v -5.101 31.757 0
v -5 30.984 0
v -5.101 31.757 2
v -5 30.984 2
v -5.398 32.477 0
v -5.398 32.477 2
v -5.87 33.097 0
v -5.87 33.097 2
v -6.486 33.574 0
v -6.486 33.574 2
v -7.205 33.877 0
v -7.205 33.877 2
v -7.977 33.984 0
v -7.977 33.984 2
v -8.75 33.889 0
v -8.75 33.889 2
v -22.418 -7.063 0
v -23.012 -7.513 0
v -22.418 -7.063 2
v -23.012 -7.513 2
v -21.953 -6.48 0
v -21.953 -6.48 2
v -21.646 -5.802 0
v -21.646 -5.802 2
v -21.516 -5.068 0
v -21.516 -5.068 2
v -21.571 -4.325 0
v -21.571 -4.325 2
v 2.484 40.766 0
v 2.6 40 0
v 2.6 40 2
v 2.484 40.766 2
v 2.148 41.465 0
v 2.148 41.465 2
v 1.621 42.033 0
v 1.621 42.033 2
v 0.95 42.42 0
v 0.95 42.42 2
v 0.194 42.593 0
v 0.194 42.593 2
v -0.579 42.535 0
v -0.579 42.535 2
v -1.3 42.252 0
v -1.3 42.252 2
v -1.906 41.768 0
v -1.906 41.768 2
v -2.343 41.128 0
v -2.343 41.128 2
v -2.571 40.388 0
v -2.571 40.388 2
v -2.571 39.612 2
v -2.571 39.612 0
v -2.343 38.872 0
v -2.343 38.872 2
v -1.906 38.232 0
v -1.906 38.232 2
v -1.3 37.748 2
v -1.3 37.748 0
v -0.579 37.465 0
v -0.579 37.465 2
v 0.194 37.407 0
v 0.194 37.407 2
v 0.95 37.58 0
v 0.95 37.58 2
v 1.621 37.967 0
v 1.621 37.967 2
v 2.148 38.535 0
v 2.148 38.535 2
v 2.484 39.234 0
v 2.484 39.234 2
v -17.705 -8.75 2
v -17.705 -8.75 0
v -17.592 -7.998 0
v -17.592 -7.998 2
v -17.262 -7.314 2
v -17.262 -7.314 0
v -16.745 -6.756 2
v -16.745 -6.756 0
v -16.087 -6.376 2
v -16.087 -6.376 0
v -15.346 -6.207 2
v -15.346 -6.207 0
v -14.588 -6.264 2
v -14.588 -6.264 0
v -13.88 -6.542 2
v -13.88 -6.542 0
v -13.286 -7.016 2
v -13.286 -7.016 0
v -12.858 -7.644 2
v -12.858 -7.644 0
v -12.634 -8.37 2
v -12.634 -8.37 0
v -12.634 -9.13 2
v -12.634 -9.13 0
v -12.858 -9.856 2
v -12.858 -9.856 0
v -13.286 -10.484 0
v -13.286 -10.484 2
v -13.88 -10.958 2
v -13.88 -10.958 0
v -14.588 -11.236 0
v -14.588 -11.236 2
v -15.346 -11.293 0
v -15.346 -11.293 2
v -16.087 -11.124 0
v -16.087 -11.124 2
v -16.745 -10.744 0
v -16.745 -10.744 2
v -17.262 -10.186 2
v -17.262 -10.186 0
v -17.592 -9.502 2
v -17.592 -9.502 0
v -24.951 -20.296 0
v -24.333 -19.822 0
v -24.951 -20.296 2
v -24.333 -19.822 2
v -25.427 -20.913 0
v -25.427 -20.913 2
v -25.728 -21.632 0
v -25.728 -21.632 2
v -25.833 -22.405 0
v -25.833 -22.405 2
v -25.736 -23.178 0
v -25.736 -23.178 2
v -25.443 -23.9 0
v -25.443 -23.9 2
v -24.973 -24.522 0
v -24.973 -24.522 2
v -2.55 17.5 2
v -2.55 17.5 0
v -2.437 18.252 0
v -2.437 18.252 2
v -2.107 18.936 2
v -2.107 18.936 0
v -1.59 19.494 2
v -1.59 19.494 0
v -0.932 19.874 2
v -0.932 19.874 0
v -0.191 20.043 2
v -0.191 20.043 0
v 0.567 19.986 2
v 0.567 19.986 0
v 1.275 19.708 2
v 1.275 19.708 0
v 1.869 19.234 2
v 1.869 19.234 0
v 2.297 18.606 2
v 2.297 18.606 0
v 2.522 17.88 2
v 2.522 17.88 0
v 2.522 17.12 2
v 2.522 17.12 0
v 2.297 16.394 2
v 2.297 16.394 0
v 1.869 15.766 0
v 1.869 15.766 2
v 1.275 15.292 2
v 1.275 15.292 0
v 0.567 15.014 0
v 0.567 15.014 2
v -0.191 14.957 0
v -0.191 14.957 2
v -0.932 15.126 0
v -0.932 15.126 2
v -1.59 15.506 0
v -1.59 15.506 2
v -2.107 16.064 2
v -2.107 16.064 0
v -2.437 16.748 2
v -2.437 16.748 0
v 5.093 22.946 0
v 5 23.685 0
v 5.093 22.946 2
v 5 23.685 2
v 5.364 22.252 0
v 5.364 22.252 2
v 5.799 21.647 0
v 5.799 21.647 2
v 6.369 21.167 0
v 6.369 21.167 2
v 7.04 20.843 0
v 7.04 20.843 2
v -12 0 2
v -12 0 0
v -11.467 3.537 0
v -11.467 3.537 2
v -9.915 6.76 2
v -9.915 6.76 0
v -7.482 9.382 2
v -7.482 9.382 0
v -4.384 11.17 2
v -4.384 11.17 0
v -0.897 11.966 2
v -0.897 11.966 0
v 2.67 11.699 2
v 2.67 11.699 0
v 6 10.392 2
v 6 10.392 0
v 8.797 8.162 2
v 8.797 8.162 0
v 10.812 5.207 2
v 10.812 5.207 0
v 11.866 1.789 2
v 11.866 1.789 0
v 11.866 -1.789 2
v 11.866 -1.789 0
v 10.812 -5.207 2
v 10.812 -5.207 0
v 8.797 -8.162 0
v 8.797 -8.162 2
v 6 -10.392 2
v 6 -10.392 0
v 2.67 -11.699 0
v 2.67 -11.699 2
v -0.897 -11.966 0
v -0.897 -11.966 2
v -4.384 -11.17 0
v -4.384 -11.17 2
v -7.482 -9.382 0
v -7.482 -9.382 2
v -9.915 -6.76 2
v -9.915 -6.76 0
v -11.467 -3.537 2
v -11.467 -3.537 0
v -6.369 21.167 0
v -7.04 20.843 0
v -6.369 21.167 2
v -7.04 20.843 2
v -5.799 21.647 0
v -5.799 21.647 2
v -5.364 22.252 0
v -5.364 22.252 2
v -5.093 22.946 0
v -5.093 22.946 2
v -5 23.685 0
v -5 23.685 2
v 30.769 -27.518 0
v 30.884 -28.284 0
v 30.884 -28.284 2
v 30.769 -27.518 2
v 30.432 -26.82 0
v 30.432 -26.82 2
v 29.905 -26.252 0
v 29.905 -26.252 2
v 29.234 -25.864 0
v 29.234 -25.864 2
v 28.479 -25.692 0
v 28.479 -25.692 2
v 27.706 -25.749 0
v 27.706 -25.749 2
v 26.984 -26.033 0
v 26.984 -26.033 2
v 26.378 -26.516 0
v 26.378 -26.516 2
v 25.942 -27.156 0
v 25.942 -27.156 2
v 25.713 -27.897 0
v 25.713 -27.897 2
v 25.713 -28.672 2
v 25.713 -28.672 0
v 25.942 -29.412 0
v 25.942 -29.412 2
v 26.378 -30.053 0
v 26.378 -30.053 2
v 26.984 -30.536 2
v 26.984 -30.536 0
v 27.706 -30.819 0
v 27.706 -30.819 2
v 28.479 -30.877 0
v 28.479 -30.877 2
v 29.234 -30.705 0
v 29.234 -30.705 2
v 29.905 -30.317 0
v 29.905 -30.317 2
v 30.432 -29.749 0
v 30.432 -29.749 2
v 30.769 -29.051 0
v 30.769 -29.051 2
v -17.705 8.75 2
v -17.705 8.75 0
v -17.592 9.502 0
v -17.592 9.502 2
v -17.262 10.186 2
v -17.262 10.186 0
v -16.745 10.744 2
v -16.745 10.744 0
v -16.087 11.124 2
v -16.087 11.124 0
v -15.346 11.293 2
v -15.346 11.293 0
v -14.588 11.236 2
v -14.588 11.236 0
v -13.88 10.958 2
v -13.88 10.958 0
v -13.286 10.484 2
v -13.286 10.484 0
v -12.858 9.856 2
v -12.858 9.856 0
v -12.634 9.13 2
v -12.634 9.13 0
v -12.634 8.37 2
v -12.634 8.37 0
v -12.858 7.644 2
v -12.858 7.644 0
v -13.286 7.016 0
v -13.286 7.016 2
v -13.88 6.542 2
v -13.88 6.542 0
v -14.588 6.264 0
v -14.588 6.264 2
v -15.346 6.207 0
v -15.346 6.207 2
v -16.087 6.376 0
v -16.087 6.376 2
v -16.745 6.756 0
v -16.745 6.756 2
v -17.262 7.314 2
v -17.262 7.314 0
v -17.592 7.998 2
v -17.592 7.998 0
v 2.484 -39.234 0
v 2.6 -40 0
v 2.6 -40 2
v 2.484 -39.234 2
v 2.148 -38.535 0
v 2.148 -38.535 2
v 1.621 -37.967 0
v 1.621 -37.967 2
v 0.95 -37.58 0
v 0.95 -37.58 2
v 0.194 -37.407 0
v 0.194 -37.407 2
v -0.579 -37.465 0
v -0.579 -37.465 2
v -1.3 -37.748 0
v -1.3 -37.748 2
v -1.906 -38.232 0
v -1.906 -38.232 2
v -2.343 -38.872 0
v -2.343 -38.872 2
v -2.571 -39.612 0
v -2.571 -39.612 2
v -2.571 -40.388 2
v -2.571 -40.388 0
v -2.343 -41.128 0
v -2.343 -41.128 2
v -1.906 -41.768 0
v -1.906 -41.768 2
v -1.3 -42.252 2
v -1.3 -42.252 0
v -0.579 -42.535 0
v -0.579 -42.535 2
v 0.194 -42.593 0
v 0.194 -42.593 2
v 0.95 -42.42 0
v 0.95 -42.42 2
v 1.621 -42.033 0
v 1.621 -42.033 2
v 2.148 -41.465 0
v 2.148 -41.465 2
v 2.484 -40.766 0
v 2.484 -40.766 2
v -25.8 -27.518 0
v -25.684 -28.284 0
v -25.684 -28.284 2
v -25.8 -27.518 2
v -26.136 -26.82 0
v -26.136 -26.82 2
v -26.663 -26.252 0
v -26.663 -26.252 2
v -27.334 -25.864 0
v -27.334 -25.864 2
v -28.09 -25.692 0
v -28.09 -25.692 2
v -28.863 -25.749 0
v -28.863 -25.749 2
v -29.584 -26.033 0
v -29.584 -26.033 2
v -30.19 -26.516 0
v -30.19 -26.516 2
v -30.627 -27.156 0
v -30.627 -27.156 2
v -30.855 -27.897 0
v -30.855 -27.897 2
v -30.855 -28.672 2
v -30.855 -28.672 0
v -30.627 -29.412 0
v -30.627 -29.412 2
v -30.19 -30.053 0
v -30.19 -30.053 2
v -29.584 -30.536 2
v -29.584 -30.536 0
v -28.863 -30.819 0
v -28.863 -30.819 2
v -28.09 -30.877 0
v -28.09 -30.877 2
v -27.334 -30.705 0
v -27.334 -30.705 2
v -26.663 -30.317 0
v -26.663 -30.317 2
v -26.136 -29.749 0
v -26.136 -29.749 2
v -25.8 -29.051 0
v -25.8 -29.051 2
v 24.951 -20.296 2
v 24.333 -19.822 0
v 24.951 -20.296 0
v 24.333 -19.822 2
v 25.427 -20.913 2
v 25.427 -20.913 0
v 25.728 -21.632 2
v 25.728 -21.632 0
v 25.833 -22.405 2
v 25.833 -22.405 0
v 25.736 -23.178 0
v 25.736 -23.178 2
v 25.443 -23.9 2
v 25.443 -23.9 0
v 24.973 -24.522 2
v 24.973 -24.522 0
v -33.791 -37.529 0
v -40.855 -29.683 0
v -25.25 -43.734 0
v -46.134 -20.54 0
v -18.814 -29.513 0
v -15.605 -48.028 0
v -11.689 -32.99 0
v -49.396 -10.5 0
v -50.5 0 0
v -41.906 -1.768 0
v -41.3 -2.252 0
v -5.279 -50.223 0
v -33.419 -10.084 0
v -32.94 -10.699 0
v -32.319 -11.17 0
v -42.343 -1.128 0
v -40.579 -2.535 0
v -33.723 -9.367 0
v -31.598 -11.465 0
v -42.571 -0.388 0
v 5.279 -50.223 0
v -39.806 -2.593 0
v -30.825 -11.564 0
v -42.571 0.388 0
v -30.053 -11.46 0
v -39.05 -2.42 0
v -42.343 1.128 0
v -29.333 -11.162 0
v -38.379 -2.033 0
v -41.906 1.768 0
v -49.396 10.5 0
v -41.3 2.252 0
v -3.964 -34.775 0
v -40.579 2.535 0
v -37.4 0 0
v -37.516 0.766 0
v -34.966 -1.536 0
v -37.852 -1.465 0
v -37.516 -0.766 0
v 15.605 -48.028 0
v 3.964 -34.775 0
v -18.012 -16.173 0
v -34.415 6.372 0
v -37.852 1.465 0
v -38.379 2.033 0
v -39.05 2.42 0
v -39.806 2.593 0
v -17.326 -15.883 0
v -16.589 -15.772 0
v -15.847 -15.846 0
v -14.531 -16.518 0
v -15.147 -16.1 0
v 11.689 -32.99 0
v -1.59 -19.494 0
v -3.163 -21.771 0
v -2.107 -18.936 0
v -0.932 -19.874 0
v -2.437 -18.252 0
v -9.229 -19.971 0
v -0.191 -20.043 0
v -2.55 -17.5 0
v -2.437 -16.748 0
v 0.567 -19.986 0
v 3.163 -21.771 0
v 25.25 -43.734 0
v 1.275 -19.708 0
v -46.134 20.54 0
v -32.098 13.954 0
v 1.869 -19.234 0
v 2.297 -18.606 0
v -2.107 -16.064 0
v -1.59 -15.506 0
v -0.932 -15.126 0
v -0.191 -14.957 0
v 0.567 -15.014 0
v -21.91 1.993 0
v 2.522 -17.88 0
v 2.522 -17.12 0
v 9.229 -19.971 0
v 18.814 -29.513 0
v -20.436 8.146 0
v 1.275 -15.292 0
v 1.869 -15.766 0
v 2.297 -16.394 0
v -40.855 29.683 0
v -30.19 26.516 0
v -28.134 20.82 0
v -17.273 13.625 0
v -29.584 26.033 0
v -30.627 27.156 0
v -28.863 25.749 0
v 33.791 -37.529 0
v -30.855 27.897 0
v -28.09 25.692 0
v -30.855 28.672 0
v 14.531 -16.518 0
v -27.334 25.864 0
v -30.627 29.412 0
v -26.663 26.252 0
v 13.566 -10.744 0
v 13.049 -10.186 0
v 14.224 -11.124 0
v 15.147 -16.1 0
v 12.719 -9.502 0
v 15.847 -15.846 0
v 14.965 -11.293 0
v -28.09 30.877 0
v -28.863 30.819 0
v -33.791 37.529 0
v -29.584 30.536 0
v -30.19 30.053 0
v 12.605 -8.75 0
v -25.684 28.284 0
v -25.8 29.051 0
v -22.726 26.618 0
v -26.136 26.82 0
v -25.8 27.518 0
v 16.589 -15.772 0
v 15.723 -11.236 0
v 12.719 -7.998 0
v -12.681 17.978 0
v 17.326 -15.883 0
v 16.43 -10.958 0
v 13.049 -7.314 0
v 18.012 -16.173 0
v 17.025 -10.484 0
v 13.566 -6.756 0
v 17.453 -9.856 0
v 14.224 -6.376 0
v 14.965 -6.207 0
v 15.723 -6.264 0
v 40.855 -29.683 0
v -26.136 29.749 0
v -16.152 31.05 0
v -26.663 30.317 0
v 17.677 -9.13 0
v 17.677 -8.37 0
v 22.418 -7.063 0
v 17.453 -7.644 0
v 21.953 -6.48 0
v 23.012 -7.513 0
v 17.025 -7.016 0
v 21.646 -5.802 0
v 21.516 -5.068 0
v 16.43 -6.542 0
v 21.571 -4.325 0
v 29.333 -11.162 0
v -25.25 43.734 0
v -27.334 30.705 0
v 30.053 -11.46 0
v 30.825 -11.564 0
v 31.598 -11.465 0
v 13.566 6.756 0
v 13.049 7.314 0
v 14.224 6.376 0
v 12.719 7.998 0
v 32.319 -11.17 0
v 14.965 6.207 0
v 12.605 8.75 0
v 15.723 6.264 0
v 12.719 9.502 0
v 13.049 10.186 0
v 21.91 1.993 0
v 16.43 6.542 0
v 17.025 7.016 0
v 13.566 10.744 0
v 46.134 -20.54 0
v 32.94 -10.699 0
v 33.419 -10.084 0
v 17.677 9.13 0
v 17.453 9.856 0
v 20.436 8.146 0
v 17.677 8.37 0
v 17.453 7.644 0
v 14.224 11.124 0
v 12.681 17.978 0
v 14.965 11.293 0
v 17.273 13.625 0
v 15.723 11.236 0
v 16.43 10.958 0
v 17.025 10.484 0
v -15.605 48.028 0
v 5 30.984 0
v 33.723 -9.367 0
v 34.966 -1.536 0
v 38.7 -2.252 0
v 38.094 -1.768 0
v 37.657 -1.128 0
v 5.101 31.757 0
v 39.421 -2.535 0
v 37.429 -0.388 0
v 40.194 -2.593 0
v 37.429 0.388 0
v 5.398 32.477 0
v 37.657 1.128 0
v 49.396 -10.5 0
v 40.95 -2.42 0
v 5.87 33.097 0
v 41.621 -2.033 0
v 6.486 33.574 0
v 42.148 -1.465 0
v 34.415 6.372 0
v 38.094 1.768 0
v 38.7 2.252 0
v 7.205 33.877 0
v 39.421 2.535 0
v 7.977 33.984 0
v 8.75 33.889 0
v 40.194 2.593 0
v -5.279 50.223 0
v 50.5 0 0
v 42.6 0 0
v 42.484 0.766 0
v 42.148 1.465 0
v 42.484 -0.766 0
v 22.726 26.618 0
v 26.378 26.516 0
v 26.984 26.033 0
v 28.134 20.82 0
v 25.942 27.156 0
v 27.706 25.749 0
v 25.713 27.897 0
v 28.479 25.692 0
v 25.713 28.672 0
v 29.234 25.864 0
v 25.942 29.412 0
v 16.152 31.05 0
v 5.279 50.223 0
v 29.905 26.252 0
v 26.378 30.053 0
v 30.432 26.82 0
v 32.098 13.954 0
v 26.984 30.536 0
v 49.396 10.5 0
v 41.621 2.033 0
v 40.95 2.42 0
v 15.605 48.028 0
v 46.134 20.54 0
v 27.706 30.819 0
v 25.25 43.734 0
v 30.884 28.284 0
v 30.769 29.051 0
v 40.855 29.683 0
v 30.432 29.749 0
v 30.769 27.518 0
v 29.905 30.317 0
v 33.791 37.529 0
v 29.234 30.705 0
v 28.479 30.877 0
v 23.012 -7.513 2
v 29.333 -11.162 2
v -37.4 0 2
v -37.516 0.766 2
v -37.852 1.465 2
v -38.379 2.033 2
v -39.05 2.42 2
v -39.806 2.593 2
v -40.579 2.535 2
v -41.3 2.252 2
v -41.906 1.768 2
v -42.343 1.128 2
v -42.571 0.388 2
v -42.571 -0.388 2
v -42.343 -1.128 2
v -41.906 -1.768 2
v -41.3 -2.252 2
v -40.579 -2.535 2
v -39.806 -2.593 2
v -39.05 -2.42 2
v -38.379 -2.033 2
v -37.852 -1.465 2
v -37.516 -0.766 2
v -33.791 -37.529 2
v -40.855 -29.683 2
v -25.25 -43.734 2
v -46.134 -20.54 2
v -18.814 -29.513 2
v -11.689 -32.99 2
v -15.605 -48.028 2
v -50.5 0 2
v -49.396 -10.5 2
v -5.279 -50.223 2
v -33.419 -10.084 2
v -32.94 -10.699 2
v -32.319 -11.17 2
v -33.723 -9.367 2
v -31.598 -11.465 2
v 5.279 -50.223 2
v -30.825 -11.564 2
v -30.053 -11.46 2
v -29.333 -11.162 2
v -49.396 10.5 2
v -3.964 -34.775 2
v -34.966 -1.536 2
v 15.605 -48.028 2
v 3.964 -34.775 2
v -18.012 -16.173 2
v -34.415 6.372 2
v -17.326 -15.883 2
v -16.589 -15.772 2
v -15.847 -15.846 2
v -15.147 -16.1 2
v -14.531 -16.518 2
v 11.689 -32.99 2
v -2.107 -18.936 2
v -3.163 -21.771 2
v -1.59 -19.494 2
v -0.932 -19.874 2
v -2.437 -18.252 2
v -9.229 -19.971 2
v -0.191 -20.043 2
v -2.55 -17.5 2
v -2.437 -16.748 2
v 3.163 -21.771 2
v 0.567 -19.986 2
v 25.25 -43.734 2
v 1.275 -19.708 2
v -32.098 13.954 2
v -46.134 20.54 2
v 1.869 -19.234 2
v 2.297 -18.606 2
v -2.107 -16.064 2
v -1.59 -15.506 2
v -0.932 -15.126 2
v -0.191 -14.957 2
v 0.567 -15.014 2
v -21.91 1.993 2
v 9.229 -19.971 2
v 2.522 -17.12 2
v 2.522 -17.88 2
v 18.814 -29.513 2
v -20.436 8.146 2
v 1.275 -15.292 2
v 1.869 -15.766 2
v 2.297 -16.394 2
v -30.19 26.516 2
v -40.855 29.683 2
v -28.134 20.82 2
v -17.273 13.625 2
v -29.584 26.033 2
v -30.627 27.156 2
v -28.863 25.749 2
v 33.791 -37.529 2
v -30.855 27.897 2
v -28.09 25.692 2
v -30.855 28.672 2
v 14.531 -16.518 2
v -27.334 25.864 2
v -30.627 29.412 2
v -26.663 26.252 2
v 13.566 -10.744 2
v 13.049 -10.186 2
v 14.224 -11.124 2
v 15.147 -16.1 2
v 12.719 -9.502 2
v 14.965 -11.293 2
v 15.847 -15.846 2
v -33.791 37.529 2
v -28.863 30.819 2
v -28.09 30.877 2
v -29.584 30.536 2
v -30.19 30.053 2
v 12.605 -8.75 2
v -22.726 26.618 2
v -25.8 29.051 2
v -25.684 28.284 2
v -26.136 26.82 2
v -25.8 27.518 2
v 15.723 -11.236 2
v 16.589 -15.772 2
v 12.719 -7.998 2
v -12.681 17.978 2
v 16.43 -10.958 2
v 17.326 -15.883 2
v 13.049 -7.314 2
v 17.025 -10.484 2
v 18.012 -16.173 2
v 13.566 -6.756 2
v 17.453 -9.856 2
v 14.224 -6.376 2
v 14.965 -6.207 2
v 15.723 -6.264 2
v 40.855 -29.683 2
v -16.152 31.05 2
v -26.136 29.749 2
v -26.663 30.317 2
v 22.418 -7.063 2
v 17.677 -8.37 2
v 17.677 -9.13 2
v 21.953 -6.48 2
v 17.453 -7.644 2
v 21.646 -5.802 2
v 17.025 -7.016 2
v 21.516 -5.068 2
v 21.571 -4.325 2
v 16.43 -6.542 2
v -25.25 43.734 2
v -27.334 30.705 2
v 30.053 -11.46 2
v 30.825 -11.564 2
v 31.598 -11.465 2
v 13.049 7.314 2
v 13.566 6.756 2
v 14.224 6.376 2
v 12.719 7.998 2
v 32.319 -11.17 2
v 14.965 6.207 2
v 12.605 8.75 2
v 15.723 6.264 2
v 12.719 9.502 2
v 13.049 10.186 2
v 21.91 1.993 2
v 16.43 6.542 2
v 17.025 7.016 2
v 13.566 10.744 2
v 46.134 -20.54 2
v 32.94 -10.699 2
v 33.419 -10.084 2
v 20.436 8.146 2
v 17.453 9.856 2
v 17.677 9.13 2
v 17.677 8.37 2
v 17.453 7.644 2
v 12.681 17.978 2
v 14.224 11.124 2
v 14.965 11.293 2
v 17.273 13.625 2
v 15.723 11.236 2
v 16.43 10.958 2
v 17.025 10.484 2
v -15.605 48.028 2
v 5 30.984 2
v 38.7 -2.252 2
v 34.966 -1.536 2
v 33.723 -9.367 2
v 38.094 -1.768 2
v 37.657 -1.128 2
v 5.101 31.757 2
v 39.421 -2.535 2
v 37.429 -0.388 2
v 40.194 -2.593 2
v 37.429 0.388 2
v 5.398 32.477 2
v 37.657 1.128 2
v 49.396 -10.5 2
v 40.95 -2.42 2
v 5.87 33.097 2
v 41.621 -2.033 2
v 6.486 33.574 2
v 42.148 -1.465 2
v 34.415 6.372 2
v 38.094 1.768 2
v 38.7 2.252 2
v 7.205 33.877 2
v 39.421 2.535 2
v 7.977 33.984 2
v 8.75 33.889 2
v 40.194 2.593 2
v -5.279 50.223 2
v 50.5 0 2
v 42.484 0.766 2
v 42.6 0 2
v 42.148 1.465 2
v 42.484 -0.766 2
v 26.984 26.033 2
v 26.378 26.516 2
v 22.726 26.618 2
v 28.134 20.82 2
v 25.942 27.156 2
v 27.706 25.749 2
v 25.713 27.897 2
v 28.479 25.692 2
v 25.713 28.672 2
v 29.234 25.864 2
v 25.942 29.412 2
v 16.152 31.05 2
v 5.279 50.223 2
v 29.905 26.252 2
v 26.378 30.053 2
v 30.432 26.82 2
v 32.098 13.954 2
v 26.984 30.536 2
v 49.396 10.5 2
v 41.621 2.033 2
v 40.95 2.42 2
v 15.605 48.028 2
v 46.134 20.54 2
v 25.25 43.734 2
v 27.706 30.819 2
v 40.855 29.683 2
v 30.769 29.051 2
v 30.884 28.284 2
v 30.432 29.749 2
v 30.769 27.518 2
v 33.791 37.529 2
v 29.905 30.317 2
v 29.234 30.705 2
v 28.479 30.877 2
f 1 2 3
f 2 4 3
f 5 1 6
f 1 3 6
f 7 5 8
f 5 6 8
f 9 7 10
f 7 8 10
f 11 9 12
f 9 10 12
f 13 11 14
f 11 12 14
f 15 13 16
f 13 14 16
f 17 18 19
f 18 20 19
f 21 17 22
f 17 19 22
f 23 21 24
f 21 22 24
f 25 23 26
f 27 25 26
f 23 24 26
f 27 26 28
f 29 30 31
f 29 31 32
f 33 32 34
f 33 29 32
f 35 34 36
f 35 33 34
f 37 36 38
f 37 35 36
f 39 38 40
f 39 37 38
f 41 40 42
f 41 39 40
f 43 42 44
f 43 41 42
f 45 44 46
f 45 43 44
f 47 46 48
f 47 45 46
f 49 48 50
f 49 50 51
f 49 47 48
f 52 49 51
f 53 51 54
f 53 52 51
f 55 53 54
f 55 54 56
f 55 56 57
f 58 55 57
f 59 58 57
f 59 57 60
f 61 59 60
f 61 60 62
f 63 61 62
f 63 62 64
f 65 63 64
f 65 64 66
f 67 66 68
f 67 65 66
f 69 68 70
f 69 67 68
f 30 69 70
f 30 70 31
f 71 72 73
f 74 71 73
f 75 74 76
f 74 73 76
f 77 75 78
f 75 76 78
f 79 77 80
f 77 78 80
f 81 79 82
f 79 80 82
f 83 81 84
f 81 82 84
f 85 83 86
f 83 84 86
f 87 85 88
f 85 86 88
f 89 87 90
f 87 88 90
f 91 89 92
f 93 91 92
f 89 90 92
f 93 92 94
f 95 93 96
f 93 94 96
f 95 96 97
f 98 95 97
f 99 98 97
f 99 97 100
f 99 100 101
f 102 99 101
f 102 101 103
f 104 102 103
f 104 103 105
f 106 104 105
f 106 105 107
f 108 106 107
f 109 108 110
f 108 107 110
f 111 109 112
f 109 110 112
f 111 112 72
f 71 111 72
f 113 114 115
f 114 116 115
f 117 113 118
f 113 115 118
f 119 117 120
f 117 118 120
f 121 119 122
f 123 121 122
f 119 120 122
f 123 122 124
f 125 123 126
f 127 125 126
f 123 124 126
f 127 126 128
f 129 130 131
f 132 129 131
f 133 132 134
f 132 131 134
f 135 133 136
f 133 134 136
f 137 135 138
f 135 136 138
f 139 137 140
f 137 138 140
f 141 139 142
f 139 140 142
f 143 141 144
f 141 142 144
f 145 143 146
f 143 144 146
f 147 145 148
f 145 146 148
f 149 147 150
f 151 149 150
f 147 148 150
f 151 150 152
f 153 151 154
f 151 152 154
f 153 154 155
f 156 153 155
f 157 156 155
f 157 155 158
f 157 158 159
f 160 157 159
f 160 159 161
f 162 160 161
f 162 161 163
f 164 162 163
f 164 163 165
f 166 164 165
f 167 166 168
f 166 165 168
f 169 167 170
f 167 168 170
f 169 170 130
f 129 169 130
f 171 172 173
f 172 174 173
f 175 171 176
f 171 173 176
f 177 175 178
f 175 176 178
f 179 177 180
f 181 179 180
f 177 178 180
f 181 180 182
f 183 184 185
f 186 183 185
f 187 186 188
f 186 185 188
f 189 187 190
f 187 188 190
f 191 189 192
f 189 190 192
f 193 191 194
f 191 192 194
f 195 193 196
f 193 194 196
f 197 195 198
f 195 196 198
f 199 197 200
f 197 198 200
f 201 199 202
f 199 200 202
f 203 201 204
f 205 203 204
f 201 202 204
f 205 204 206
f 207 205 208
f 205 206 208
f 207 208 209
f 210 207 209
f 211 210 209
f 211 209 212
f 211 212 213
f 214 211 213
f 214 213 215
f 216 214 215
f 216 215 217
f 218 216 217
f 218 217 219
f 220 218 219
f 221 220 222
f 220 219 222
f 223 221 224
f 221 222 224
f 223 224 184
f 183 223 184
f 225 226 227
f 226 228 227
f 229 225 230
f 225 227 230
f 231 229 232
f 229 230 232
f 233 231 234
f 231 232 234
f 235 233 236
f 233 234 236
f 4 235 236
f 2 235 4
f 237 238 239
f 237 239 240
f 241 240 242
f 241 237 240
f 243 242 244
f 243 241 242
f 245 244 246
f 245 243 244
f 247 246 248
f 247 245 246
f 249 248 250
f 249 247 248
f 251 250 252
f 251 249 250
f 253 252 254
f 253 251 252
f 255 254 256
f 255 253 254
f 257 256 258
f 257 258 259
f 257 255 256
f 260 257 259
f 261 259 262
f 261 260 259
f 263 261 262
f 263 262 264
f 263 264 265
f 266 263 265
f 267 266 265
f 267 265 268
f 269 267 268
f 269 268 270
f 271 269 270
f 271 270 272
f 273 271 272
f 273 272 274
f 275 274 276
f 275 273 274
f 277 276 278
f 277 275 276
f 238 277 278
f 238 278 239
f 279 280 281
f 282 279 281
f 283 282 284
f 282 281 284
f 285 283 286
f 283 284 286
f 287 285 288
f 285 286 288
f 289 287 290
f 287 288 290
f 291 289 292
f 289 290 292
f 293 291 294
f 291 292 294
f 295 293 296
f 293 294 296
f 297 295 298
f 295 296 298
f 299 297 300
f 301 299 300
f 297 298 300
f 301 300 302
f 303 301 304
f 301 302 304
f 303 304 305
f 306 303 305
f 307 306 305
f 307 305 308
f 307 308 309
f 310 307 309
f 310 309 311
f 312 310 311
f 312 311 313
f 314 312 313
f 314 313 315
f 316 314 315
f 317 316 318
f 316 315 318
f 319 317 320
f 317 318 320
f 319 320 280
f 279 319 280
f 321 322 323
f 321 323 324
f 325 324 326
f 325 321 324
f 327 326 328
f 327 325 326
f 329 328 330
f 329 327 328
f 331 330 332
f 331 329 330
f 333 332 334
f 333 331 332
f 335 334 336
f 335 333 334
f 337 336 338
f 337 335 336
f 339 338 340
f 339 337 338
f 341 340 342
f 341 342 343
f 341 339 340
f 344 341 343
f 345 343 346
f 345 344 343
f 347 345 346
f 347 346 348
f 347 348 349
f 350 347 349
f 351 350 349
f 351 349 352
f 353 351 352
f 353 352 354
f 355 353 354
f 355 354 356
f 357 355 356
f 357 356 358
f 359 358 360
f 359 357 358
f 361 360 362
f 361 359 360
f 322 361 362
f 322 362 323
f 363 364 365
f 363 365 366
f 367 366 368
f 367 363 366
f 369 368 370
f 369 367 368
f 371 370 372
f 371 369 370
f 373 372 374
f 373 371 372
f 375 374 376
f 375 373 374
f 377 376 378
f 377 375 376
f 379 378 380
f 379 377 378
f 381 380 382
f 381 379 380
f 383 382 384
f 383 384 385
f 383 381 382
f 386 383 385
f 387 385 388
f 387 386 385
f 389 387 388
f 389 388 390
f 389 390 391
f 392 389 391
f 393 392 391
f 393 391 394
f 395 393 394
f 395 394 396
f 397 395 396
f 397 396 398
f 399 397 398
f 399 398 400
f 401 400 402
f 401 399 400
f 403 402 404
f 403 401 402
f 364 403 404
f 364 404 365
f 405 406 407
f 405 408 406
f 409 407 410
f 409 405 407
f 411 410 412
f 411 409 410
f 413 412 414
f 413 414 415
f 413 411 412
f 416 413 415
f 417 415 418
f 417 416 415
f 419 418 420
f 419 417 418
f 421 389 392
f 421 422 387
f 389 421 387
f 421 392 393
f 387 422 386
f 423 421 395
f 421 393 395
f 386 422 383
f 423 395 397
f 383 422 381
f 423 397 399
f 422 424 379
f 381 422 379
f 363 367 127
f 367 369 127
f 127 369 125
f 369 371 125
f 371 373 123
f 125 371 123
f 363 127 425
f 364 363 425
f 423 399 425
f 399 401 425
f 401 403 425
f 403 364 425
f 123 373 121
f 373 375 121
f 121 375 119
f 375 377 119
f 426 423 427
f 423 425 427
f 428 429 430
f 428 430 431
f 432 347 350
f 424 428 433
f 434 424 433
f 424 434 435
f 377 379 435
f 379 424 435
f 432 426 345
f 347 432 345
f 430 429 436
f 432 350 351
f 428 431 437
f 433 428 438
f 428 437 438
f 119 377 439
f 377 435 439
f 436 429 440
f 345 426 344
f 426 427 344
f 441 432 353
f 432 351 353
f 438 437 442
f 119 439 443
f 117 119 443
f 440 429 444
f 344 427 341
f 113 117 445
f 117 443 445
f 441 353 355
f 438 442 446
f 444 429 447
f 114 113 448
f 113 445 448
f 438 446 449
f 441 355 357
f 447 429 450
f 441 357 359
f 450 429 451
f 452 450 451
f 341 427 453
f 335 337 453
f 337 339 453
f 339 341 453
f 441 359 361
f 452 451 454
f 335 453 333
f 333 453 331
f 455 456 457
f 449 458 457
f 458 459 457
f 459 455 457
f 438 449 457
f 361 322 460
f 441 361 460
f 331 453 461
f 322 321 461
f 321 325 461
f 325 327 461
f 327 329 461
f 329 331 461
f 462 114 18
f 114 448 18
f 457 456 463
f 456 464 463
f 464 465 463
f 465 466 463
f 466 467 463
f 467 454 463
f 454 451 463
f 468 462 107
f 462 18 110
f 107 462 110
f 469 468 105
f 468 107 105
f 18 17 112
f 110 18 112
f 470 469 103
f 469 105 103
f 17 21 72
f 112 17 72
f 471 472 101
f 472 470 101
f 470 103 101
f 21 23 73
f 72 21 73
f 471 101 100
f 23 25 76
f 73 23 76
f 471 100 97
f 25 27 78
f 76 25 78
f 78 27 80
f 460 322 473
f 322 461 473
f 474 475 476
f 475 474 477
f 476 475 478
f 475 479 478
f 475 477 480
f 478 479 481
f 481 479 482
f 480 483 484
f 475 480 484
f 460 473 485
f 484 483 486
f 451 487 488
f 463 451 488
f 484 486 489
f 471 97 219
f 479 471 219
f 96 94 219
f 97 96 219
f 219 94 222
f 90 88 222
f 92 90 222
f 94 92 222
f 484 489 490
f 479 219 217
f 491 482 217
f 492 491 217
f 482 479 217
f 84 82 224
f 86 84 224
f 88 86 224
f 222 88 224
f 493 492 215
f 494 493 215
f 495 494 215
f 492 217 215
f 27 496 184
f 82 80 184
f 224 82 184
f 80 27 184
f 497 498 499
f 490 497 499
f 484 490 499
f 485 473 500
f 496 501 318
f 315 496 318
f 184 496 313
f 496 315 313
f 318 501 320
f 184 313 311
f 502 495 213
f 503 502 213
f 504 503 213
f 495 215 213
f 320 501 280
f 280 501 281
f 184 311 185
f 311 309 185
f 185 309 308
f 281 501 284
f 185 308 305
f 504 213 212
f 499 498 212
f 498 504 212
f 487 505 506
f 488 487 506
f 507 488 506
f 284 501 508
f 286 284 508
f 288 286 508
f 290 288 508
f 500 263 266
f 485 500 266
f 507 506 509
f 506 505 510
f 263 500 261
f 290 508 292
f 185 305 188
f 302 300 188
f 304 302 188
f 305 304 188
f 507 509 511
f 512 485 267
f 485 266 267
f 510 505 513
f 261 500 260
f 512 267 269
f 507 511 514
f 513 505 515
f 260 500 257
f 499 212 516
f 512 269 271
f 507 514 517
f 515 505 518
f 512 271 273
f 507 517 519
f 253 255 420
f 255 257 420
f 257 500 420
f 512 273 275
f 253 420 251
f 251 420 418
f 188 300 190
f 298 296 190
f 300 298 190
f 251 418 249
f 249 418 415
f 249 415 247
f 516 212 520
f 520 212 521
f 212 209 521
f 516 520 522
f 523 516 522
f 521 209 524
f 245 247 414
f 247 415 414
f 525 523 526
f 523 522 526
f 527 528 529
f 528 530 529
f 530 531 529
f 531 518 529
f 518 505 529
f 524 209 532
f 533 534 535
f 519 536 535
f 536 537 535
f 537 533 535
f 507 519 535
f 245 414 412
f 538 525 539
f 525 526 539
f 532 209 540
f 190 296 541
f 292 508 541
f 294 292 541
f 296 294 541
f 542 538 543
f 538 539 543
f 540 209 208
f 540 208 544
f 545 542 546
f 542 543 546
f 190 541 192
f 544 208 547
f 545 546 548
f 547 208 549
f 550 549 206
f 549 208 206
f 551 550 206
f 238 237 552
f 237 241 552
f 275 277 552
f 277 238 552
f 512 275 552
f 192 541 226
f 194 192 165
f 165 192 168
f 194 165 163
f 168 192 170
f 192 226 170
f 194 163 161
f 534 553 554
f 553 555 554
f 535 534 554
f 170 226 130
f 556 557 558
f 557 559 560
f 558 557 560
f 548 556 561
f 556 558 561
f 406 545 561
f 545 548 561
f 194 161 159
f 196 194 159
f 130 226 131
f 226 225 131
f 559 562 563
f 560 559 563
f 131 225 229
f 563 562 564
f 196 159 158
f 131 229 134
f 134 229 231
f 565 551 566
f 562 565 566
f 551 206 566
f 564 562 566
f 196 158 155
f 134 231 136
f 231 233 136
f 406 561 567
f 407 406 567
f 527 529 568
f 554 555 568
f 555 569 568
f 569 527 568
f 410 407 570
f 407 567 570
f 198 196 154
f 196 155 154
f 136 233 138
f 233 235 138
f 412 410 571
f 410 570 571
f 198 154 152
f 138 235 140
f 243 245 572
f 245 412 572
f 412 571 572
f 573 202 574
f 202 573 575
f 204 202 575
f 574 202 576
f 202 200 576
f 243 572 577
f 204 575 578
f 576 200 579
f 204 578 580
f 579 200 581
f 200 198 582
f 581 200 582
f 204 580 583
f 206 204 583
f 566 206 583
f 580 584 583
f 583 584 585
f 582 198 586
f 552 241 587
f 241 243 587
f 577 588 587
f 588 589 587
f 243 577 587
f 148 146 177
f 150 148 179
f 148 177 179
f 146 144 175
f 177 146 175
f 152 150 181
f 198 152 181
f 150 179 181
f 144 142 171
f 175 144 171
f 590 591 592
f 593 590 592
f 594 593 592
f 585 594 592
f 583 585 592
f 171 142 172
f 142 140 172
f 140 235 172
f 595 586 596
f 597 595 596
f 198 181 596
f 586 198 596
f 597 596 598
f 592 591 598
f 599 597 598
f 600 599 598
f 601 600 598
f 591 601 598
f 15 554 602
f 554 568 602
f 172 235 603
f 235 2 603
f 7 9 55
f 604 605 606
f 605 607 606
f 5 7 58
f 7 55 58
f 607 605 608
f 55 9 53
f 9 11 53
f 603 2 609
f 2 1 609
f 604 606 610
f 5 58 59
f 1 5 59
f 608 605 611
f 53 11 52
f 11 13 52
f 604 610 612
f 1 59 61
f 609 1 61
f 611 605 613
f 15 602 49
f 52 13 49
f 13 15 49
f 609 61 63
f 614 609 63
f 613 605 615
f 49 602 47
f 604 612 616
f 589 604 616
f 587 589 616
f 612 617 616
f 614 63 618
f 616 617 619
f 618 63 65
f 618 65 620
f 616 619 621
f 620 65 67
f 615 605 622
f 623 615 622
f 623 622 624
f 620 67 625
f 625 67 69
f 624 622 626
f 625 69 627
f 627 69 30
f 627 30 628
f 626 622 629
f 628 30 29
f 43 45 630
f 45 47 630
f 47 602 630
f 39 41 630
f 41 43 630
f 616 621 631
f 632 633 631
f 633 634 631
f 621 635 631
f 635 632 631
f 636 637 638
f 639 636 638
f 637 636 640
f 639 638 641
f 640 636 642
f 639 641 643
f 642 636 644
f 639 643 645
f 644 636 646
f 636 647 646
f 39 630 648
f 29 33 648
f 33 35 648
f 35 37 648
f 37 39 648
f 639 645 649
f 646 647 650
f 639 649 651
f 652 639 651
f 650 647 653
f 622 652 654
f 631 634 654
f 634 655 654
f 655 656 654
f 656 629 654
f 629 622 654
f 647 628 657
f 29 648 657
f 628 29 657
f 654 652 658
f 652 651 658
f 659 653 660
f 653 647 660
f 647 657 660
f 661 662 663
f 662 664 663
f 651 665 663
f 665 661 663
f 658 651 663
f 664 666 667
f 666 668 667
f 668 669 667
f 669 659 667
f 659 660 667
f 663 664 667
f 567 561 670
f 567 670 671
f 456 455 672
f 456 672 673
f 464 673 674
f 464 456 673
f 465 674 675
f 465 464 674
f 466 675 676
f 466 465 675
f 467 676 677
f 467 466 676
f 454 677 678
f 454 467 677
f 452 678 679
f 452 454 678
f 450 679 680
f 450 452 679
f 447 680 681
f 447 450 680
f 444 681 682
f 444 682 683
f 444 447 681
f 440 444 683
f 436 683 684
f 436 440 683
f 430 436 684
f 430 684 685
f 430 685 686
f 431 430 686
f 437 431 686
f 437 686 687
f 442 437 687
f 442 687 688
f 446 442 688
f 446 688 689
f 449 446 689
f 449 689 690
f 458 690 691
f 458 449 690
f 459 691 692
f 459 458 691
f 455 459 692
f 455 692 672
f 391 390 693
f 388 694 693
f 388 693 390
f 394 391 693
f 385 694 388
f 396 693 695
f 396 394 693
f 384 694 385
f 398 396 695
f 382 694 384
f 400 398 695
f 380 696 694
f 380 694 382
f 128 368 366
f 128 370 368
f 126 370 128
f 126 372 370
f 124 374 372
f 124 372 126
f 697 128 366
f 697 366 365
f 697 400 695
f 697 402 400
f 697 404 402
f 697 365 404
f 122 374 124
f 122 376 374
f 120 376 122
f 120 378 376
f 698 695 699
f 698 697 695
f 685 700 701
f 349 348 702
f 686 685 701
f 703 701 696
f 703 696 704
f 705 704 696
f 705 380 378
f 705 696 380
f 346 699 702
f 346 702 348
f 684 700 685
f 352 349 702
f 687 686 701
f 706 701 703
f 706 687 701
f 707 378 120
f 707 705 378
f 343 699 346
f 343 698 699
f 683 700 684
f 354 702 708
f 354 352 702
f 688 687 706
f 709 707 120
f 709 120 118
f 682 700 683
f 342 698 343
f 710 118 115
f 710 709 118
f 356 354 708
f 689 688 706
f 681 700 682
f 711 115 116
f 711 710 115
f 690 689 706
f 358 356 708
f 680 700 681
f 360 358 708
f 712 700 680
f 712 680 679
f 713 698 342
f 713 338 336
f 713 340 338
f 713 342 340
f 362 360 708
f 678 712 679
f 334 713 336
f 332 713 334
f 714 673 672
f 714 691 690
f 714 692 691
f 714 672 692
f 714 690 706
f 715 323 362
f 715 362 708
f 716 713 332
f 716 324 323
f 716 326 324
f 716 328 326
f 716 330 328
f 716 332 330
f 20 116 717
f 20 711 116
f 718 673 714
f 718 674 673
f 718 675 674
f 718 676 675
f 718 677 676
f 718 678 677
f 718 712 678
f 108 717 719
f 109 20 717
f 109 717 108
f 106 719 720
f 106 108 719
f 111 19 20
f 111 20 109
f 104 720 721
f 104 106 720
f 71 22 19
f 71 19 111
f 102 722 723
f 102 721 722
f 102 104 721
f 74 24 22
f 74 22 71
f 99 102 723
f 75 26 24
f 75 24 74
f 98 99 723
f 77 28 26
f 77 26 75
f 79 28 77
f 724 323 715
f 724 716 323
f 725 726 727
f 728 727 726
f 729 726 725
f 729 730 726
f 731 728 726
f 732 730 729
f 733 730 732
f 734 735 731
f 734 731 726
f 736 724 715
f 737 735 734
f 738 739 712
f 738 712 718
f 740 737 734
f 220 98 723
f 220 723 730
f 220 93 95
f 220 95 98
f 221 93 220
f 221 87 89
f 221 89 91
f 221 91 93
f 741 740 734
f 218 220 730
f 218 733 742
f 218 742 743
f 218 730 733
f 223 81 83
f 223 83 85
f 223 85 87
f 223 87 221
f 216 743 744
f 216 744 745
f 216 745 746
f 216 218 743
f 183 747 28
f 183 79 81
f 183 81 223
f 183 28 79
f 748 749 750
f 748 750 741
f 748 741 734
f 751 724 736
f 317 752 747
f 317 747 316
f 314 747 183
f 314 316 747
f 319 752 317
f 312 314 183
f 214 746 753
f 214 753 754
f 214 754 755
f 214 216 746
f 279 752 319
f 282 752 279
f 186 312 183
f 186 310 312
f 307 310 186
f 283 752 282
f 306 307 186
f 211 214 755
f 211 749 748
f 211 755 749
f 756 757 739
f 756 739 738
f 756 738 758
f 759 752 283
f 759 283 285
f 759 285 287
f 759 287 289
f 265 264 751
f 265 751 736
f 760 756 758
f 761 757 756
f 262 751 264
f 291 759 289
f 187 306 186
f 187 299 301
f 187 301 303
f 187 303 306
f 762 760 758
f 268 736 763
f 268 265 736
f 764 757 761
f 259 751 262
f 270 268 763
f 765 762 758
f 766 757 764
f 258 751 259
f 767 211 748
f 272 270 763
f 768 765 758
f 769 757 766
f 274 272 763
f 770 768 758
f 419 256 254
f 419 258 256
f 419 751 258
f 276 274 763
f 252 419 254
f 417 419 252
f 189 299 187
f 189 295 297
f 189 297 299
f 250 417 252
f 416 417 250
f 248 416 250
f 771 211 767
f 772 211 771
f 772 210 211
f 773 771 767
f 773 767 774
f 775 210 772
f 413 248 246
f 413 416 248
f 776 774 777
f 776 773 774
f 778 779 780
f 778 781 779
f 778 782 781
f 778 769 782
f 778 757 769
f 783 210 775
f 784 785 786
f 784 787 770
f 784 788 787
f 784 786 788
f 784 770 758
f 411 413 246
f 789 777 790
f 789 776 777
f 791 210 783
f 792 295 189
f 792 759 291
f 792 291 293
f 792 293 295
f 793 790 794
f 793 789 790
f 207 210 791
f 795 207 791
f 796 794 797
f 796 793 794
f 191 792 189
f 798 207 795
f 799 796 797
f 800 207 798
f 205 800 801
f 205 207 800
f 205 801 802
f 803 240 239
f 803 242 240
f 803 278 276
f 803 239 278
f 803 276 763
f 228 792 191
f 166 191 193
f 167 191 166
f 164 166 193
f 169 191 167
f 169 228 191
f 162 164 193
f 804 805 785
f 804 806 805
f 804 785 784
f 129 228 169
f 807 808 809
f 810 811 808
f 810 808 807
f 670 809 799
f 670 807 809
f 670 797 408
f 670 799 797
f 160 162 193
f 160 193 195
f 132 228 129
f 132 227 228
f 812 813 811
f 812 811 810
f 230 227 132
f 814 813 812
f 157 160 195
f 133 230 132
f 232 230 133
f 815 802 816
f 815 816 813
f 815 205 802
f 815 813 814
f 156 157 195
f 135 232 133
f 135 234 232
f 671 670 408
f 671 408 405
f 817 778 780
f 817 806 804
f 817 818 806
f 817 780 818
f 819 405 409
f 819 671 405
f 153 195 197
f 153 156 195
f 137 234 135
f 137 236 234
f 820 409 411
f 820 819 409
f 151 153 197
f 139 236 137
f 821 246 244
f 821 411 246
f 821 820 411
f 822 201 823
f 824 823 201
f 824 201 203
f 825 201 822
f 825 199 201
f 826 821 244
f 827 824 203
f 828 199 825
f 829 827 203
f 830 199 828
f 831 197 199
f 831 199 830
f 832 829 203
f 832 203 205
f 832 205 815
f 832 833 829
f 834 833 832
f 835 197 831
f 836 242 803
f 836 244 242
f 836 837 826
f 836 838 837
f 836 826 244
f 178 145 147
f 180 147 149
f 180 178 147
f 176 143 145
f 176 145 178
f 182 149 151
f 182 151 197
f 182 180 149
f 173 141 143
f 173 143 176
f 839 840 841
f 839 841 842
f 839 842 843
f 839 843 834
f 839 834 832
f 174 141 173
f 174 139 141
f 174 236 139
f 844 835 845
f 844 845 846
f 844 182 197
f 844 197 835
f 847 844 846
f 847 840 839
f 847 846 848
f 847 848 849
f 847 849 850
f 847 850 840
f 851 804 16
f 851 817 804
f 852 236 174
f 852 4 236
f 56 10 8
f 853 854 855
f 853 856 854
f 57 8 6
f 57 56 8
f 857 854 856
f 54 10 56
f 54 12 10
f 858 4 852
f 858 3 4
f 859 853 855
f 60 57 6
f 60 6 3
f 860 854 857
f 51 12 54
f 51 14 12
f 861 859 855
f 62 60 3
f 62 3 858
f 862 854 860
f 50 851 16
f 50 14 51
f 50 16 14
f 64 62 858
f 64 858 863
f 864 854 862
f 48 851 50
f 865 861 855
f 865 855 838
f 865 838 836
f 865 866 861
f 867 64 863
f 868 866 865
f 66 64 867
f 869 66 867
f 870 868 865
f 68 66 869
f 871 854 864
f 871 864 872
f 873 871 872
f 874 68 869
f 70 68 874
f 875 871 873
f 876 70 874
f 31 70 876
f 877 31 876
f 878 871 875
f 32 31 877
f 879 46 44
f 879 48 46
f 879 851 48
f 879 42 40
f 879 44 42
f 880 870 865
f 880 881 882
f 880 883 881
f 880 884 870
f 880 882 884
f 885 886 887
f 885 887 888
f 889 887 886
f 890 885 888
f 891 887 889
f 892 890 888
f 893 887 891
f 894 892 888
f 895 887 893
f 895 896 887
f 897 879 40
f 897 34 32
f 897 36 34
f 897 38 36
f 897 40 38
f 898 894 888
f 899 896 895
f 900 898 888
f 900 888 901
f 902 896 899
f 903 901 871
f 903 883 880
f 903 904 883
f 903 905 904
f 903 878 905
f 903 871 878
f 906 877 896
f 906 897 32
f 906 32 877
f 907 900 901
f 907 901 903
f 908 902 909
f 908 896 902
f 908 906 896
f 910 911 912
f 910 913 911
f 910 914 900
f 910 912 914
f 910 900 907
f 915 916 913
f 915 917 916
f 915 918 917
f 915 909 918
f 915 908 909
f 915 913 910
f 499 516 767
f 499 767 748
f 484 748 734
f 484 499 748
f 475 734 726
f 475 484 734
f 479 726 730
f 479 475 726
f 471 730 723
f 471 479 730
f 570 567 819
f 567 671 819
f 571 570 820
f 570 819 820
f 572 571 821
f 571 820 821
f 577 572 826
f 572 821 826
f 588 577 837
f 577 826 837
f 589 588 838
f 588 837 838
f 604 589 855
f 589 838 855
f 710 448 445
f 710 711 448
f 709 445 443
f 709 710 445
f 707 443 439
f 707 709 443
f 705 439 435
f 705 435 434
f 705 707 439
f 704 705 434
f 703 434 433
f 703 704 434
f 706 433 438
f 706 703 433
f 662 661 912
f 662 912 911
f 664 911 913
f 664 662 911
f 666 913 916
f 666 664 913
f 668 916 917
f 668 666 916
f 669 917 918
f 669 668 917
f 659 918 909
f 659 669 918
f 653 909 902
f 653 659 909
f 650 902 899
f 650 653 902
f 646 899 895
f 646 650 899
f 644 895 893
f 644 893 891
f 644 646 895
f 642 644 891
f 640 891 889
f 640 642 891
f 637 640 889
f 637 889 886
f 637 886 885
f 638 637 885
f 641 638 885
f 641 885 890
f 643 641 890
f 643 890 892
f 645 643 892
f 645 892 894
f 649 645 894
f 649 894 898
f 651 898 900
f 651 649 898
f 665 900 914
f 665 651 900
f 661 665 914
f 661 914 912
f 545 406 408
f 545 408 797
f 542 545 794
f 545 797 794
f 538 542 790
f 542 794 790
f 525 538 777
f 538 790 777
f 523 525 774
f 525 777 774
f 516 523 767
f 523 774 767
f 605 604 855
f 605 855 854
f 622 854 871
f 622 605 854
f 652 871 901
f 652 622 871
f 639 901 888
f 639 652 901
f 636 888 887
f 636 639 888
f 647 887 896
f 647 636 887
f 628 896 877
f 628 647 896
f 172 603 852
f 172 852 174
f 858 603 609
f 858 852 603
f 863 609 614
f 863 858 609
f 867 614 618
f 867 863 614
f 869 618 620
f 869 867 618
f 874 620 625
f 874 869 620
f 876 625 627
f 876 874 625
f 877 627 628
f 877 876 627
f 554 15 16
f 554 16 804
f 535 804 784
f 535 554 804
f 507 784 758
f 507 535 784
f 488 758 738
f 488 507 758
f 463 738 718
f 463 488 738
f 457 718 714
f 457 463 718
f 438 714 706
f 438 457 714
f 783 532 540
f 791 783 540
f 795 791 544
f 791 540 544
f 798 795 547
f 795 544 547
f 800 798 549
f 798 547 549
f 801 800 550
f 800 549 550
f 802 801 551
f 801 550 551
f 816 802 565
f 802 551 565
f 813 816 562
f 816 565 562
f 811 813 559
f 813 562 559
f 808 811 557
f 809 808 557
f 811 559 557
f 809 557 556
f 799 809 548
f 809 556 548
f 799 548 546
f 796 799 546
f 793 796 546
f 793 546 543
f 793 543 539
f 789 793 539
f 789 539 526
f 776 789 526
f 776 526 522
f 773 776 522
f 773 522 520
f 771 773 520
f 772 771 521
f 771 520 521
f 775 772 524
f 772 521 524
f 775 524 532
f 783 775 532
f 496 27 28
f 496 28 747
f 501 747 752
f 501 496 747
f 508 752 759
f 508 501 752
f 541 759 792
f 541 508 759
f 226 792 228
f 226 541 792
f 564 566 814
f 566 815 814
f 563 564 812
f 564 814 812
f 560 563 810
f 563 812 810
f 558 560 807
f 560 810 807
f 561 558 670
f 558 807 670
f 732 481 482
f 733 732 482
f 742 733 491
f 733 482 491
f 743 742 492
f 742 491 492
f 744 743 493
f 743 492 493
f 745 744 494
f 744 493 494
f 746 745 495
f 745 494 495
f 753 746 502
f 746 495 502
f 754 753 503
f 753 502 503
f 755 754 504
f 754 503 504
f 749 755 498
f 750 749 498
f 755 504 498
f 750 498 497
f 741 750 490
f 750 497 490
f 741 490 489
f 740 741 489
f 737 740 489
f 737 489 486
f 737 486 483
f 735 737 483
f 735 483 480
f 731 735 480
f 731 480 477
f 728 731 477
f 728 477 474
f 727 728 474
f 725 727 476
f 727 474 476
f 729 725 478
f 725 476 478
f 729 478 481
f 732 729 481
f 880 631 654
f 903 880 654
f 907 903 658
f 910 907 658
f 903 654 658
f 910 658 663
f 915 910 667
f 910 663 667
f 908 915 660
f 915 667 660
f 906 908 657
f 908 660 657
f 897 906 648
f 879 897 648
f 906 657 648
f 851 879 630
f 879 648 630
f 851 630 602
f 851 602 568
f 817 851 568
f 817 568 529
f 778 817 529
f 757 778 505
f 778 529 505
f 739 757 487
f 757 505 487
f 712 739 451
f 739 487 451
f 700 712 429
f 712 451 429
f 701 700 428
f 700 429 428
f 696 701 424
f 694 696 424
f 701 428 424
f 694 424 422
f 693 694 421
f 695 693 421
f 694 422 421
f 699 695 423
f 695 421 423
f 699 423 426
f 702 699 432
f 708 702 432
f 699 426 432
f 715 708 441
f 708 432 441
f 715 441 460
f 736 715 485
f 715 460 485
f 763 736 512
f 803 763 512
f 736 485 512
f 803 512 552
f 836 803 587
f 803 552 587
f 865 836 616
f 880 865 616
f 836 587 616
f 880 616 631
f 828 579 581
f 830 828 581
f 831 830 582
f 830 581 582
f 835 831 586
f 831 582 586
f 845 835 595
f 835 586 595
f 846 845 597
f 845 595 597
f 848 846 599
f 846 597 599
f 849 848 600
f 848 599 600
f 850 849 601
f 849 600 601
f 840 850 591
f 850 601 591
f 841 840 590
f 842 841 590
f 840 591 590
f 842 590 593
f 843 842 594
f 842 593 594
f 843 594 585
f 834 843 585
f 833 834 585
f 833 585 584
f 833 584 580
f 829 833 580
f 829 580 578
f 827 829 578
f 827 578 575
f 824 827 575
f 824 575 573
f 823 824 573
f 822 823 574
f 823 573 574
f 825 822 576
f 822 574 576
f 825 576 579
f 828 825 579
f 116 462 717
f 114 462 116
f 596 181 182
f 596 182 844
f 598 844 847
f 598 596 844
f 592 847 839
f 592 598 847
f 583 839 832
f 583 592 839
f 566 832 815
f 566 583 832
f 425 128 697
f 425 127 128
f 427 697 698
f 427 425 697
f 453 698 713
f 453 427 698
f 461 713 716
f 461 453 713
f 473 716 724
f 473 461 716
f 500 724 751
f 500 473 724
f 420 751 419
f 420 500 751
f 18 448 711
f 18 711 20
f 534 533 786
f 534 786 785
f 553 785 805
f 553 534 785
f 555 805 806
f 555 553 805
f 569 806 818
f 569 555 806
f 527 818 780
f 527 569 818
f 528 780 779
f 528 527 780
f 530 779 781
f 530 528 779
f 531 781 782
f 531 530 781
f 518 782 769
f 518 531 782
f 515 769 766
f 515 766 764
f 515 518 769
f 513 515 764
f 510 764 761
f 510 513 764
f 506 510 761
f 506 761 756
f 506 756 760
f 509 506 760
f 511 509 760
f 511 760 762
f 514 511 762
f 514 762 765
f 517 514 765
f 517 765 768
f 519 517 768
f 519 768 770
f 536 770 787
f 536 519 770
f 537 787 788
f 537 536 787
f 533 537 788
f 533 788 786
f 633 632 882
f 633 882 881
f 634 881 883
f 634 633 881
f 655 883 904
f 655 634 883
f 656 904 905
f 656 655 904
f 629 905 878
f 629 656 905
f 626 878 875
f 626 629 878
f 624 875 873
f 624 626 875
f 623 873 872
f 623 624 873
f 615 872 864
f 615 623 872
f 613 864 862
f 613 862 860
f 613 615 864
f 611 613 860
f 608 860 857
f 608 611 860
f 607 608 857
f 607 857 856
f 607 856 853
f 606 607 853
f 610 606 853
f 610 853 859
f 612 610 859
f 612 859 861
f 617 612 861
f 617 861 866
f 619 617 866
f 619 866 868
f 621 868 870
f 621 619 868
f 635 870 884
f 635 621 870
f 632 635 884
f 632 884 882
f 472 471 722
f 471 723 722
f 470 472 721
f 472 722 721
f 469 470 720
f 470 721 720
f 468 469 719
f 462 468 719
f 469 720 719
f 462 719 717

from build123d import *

# Parameters (mm, degrees)
SKETCH_1_R      = 50.5
SKETCH_1_R_2    = 2.6
SKETCH_1_R_3    = 35
EXTRUDE_1_DEPTH = 2
SKETCH_3_R      = 2.55
SKETCH_3_R_2    = 12
EXTRUDE_4_DEPTH = 2
FILLET_2_R      = 3


with BuildPart() as part:
    # 草图1 → 凸台-拉伸1 (new body)
    with BuildSketch(Plane.XY):
        Circle(SKETCH_1_R)
        with Locations((0, 40)):
            Circle(SKETCH_1_R_2, mode=Mode.SUBTRACT)
        Circle(SKETCH_1_R_3, mode=Mode.SUBTRACT)
        with Locations((28.284271247, 28.284271247)):
            Circle(SKETCH_1_R_2, mode=Mode.SUBTRACT)
        with Locations((40, 0)):
            Circle(SKETCH_1_R_2, mode=Mode.SUBTRACT)
        with Locations((28.284271247, -28.284271247)):
            Circle(SKETCH_1_R_2, mode=Mode.SUBTRACT)
        with Locations((0, -40)):
            Circle(SKETCH_1_R_2, mode=Mode.SUBTRACT)
        with Locations((-28.284271247, -28.284271247)):
            Circle(SKETCH_1_R_2, mode=Mode.SUBTRACT)
        with Locations((-40, 0)):
            Circle(SKETCH_1_R_2, mode=Mode.SUBTRACT)
        with Locations((-28.284271247, 28.284271247)):
            Circle(SKETCH_1_R_2, mode=Mode.SUBTRACT)
    extrude(amount=EXTRUDE_1_DEPTH)

    # 草图3 → 凸台-拉伸4 (add)
    with BuildSketch(Plane(origin=(0, 0, 0), x_dir=(-1, 0, 0), z_dir=(0, 0, -1))):
        with BuildLine():
            Line((-5, 34.641016151), (-5, 21.424285286))
            ThreePointArc((-5, 21.424285286), (-19.052558883, 11), (-21.053975315, -6.382015624))
            Line((-21.053975315, -6.382015624), (-32.5, -12.990381057))
            ThreePointArc((-32.5, -12.990381057), (-30.310889132, -17.5), (-27.5, -21.650635095))
            Line((-27.5, -21.650635095), (-16.053975315, -15.042269662))
            ThreePointArc((-16.053975315, -15.042269662), (0, -22), (16.053975315, -15.042269662))
            Line((16.053975315, -15.042269662), (27.5, -21.650635095))
            ThreePointArc((27.5, -21.650635095), (30.310889132, -17.5), (32.5, -12.990381057))
            Line((32.5, -12.990381057), (21.053975315, -6.382015624))
            ThreePointArc((21.053975315, -6.382015624), (19.052558883, 11), (5, 21.424285286))
            Line((5, 21.424285286), (5, 34.641016151))
            ThreePointArc((5, 34.641016151), (0, 35), (-5, 34.641016151))
        make_face()
        with Locations((0, 17.5)):
            Circle(SKETCH_3_R, mode=Mode.SUBTRACT)
        with Locations((0, -17.5)):
            Circle(SKETCH_3_R, mode=Mode.SUBTRACT)
        with Locations((-15.155444566, -8.75)):
            Circle(SKETCH_3_R, mode=Mode.SUBTRACT)
        with Locations((15.155444566, -8.75)):
            Circle(SKETCH_3_R, mode=Mode.SUBTRACT)
        with Locations((-15.155444566, 8.75)):
            Circle(SKETCH_3_R, mode=Mode.SUBTRACT)
        Circle(SKETCH_3_R_2, mode=Mode.SUBTRACT)
        with Locations((15.155444566, 8.75)):
            Circle(SKETCH_3_R, mode=Mode.SUBTRACT)
    extrude(amount=-EXTRUDE_4_DEPTH)

    # 圆角2
    fillet_2_edges = [part.edges().sort_by_distance(p)[0] for p in [
        (5, 21.424285286, 1),
        (5, 34.641016151, 1),
        (-5, 34.641016151, 1),
        (-5, 21.424285286, 1),
        (-21.053975315, -6.382015624, 1),
        (-32.5, -12.990381057, 1),
        (-27.5, -21.650635095, 1),
        (-16.053975315, -15.042269662, 1),
        (16.053975315, -15.042269662, 1),
        (27.5, -21.650635095, 1),
        (32.5, -12.990381057, 1),
        (21.053975315, -6.382015624, 1),
    ]]
    fillet(fillet_2_edges, radius=FILLET_2_R)


solid = part.part
